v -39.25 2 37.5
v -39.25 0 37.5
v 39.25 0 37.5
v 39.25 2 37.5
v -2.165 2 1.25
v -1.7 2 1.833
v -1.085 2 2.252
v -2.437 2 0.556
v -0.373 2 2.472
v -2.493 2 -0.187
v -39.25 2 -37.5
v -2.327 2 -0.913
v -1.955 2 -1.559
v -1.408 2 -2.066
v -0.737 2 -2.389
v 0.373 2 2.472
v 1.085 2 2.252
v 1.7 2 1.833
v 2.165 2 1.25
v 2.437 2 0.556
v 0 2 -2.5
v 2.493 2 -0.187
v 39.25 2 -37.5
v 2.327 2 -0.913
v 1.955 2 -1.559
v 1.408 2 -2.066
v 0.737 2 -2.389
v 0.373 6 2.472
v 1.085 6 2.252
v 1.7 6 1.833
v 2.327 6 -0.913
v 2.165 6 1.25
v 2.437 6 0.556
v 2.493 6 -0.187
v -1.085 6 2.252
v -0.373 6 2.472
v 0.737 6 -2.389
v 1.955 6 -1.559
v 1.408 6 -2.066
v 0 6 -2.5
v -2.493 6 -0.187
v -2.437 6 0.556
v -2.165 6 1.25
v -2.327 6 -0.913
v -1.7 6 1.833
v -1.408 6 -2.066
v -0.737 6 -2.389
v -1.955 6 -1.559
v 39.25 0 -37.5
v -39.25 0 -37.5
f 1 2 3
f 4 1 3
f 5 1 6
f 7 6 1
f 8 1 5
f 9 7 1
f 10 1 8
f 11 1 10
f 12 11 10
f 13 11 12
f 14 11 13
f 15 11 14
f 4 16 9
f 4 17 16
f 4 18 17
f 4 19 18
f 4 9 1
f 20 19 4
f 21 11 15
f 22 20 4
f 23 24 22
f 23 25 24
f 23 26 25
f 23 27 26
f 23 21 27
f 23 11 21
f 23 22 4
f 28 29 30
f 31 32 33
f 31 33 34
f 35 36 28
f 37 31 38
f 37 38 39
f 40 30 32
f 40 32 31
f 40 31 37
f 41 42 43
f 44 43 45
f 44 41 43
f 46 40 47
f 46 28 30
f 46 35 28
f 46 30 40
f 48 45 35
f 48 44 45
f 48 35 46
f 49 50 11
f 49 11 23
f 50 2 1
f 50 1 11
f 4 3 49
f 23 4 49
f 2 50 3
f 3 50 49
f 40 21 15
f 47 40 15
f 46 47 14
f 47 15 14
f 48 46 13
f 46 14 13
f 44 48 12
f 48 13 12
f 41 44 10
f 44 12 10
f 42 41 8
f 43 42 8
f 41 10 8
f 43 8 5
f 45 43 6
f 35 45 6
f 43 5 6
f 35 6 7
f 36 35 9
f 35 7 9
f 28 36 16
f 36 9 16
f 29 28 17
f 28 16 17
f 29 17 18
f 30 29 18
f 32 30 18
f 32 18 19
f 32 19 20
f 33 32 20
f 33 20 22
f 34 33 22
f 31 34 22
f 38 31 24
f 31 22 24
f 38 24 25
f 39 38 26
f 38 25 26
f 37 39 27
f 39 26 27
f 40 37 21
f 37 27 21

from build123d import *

# Parameters (mm, degrees)
CROQUIS1_W              = 78.5
CROQUIS1_H              = 75
SALIENTE_EXTRUIR1_DEPTH = 2
CROQUIS2_R              = 2.5
SALIENTE_EXTRUIR2_DEPTH = 4


with BuildPart() as part:
    # Croquis1 → Saliente-Extruir1 (new body)
    with BuildSketch(Plane(origin=(0, 0, 0), x_dir=(1, 0, 0), z_dir=(0, 1, 0))):
        Rectangle(CROQUIS1_W, CROQUIS1_H)
    extrude(amount=SALIENTE_EXTRUIR1_DEPTH)

    # Croquis2 → Saliente-Extruir2 (add)
    with BuildSketch(Plane(origin=(0, 2, 0), x_dir=(1, 0, 0), z_dir=(0, 1, 0))):
        with Locations(Location((0, 0, 0), (0, 0, 90))):
            Circle(CROQUIS2_R)
    extrude(amount=SALIENTE_EXTRUIR2_DEPTH)


solid = part.part
